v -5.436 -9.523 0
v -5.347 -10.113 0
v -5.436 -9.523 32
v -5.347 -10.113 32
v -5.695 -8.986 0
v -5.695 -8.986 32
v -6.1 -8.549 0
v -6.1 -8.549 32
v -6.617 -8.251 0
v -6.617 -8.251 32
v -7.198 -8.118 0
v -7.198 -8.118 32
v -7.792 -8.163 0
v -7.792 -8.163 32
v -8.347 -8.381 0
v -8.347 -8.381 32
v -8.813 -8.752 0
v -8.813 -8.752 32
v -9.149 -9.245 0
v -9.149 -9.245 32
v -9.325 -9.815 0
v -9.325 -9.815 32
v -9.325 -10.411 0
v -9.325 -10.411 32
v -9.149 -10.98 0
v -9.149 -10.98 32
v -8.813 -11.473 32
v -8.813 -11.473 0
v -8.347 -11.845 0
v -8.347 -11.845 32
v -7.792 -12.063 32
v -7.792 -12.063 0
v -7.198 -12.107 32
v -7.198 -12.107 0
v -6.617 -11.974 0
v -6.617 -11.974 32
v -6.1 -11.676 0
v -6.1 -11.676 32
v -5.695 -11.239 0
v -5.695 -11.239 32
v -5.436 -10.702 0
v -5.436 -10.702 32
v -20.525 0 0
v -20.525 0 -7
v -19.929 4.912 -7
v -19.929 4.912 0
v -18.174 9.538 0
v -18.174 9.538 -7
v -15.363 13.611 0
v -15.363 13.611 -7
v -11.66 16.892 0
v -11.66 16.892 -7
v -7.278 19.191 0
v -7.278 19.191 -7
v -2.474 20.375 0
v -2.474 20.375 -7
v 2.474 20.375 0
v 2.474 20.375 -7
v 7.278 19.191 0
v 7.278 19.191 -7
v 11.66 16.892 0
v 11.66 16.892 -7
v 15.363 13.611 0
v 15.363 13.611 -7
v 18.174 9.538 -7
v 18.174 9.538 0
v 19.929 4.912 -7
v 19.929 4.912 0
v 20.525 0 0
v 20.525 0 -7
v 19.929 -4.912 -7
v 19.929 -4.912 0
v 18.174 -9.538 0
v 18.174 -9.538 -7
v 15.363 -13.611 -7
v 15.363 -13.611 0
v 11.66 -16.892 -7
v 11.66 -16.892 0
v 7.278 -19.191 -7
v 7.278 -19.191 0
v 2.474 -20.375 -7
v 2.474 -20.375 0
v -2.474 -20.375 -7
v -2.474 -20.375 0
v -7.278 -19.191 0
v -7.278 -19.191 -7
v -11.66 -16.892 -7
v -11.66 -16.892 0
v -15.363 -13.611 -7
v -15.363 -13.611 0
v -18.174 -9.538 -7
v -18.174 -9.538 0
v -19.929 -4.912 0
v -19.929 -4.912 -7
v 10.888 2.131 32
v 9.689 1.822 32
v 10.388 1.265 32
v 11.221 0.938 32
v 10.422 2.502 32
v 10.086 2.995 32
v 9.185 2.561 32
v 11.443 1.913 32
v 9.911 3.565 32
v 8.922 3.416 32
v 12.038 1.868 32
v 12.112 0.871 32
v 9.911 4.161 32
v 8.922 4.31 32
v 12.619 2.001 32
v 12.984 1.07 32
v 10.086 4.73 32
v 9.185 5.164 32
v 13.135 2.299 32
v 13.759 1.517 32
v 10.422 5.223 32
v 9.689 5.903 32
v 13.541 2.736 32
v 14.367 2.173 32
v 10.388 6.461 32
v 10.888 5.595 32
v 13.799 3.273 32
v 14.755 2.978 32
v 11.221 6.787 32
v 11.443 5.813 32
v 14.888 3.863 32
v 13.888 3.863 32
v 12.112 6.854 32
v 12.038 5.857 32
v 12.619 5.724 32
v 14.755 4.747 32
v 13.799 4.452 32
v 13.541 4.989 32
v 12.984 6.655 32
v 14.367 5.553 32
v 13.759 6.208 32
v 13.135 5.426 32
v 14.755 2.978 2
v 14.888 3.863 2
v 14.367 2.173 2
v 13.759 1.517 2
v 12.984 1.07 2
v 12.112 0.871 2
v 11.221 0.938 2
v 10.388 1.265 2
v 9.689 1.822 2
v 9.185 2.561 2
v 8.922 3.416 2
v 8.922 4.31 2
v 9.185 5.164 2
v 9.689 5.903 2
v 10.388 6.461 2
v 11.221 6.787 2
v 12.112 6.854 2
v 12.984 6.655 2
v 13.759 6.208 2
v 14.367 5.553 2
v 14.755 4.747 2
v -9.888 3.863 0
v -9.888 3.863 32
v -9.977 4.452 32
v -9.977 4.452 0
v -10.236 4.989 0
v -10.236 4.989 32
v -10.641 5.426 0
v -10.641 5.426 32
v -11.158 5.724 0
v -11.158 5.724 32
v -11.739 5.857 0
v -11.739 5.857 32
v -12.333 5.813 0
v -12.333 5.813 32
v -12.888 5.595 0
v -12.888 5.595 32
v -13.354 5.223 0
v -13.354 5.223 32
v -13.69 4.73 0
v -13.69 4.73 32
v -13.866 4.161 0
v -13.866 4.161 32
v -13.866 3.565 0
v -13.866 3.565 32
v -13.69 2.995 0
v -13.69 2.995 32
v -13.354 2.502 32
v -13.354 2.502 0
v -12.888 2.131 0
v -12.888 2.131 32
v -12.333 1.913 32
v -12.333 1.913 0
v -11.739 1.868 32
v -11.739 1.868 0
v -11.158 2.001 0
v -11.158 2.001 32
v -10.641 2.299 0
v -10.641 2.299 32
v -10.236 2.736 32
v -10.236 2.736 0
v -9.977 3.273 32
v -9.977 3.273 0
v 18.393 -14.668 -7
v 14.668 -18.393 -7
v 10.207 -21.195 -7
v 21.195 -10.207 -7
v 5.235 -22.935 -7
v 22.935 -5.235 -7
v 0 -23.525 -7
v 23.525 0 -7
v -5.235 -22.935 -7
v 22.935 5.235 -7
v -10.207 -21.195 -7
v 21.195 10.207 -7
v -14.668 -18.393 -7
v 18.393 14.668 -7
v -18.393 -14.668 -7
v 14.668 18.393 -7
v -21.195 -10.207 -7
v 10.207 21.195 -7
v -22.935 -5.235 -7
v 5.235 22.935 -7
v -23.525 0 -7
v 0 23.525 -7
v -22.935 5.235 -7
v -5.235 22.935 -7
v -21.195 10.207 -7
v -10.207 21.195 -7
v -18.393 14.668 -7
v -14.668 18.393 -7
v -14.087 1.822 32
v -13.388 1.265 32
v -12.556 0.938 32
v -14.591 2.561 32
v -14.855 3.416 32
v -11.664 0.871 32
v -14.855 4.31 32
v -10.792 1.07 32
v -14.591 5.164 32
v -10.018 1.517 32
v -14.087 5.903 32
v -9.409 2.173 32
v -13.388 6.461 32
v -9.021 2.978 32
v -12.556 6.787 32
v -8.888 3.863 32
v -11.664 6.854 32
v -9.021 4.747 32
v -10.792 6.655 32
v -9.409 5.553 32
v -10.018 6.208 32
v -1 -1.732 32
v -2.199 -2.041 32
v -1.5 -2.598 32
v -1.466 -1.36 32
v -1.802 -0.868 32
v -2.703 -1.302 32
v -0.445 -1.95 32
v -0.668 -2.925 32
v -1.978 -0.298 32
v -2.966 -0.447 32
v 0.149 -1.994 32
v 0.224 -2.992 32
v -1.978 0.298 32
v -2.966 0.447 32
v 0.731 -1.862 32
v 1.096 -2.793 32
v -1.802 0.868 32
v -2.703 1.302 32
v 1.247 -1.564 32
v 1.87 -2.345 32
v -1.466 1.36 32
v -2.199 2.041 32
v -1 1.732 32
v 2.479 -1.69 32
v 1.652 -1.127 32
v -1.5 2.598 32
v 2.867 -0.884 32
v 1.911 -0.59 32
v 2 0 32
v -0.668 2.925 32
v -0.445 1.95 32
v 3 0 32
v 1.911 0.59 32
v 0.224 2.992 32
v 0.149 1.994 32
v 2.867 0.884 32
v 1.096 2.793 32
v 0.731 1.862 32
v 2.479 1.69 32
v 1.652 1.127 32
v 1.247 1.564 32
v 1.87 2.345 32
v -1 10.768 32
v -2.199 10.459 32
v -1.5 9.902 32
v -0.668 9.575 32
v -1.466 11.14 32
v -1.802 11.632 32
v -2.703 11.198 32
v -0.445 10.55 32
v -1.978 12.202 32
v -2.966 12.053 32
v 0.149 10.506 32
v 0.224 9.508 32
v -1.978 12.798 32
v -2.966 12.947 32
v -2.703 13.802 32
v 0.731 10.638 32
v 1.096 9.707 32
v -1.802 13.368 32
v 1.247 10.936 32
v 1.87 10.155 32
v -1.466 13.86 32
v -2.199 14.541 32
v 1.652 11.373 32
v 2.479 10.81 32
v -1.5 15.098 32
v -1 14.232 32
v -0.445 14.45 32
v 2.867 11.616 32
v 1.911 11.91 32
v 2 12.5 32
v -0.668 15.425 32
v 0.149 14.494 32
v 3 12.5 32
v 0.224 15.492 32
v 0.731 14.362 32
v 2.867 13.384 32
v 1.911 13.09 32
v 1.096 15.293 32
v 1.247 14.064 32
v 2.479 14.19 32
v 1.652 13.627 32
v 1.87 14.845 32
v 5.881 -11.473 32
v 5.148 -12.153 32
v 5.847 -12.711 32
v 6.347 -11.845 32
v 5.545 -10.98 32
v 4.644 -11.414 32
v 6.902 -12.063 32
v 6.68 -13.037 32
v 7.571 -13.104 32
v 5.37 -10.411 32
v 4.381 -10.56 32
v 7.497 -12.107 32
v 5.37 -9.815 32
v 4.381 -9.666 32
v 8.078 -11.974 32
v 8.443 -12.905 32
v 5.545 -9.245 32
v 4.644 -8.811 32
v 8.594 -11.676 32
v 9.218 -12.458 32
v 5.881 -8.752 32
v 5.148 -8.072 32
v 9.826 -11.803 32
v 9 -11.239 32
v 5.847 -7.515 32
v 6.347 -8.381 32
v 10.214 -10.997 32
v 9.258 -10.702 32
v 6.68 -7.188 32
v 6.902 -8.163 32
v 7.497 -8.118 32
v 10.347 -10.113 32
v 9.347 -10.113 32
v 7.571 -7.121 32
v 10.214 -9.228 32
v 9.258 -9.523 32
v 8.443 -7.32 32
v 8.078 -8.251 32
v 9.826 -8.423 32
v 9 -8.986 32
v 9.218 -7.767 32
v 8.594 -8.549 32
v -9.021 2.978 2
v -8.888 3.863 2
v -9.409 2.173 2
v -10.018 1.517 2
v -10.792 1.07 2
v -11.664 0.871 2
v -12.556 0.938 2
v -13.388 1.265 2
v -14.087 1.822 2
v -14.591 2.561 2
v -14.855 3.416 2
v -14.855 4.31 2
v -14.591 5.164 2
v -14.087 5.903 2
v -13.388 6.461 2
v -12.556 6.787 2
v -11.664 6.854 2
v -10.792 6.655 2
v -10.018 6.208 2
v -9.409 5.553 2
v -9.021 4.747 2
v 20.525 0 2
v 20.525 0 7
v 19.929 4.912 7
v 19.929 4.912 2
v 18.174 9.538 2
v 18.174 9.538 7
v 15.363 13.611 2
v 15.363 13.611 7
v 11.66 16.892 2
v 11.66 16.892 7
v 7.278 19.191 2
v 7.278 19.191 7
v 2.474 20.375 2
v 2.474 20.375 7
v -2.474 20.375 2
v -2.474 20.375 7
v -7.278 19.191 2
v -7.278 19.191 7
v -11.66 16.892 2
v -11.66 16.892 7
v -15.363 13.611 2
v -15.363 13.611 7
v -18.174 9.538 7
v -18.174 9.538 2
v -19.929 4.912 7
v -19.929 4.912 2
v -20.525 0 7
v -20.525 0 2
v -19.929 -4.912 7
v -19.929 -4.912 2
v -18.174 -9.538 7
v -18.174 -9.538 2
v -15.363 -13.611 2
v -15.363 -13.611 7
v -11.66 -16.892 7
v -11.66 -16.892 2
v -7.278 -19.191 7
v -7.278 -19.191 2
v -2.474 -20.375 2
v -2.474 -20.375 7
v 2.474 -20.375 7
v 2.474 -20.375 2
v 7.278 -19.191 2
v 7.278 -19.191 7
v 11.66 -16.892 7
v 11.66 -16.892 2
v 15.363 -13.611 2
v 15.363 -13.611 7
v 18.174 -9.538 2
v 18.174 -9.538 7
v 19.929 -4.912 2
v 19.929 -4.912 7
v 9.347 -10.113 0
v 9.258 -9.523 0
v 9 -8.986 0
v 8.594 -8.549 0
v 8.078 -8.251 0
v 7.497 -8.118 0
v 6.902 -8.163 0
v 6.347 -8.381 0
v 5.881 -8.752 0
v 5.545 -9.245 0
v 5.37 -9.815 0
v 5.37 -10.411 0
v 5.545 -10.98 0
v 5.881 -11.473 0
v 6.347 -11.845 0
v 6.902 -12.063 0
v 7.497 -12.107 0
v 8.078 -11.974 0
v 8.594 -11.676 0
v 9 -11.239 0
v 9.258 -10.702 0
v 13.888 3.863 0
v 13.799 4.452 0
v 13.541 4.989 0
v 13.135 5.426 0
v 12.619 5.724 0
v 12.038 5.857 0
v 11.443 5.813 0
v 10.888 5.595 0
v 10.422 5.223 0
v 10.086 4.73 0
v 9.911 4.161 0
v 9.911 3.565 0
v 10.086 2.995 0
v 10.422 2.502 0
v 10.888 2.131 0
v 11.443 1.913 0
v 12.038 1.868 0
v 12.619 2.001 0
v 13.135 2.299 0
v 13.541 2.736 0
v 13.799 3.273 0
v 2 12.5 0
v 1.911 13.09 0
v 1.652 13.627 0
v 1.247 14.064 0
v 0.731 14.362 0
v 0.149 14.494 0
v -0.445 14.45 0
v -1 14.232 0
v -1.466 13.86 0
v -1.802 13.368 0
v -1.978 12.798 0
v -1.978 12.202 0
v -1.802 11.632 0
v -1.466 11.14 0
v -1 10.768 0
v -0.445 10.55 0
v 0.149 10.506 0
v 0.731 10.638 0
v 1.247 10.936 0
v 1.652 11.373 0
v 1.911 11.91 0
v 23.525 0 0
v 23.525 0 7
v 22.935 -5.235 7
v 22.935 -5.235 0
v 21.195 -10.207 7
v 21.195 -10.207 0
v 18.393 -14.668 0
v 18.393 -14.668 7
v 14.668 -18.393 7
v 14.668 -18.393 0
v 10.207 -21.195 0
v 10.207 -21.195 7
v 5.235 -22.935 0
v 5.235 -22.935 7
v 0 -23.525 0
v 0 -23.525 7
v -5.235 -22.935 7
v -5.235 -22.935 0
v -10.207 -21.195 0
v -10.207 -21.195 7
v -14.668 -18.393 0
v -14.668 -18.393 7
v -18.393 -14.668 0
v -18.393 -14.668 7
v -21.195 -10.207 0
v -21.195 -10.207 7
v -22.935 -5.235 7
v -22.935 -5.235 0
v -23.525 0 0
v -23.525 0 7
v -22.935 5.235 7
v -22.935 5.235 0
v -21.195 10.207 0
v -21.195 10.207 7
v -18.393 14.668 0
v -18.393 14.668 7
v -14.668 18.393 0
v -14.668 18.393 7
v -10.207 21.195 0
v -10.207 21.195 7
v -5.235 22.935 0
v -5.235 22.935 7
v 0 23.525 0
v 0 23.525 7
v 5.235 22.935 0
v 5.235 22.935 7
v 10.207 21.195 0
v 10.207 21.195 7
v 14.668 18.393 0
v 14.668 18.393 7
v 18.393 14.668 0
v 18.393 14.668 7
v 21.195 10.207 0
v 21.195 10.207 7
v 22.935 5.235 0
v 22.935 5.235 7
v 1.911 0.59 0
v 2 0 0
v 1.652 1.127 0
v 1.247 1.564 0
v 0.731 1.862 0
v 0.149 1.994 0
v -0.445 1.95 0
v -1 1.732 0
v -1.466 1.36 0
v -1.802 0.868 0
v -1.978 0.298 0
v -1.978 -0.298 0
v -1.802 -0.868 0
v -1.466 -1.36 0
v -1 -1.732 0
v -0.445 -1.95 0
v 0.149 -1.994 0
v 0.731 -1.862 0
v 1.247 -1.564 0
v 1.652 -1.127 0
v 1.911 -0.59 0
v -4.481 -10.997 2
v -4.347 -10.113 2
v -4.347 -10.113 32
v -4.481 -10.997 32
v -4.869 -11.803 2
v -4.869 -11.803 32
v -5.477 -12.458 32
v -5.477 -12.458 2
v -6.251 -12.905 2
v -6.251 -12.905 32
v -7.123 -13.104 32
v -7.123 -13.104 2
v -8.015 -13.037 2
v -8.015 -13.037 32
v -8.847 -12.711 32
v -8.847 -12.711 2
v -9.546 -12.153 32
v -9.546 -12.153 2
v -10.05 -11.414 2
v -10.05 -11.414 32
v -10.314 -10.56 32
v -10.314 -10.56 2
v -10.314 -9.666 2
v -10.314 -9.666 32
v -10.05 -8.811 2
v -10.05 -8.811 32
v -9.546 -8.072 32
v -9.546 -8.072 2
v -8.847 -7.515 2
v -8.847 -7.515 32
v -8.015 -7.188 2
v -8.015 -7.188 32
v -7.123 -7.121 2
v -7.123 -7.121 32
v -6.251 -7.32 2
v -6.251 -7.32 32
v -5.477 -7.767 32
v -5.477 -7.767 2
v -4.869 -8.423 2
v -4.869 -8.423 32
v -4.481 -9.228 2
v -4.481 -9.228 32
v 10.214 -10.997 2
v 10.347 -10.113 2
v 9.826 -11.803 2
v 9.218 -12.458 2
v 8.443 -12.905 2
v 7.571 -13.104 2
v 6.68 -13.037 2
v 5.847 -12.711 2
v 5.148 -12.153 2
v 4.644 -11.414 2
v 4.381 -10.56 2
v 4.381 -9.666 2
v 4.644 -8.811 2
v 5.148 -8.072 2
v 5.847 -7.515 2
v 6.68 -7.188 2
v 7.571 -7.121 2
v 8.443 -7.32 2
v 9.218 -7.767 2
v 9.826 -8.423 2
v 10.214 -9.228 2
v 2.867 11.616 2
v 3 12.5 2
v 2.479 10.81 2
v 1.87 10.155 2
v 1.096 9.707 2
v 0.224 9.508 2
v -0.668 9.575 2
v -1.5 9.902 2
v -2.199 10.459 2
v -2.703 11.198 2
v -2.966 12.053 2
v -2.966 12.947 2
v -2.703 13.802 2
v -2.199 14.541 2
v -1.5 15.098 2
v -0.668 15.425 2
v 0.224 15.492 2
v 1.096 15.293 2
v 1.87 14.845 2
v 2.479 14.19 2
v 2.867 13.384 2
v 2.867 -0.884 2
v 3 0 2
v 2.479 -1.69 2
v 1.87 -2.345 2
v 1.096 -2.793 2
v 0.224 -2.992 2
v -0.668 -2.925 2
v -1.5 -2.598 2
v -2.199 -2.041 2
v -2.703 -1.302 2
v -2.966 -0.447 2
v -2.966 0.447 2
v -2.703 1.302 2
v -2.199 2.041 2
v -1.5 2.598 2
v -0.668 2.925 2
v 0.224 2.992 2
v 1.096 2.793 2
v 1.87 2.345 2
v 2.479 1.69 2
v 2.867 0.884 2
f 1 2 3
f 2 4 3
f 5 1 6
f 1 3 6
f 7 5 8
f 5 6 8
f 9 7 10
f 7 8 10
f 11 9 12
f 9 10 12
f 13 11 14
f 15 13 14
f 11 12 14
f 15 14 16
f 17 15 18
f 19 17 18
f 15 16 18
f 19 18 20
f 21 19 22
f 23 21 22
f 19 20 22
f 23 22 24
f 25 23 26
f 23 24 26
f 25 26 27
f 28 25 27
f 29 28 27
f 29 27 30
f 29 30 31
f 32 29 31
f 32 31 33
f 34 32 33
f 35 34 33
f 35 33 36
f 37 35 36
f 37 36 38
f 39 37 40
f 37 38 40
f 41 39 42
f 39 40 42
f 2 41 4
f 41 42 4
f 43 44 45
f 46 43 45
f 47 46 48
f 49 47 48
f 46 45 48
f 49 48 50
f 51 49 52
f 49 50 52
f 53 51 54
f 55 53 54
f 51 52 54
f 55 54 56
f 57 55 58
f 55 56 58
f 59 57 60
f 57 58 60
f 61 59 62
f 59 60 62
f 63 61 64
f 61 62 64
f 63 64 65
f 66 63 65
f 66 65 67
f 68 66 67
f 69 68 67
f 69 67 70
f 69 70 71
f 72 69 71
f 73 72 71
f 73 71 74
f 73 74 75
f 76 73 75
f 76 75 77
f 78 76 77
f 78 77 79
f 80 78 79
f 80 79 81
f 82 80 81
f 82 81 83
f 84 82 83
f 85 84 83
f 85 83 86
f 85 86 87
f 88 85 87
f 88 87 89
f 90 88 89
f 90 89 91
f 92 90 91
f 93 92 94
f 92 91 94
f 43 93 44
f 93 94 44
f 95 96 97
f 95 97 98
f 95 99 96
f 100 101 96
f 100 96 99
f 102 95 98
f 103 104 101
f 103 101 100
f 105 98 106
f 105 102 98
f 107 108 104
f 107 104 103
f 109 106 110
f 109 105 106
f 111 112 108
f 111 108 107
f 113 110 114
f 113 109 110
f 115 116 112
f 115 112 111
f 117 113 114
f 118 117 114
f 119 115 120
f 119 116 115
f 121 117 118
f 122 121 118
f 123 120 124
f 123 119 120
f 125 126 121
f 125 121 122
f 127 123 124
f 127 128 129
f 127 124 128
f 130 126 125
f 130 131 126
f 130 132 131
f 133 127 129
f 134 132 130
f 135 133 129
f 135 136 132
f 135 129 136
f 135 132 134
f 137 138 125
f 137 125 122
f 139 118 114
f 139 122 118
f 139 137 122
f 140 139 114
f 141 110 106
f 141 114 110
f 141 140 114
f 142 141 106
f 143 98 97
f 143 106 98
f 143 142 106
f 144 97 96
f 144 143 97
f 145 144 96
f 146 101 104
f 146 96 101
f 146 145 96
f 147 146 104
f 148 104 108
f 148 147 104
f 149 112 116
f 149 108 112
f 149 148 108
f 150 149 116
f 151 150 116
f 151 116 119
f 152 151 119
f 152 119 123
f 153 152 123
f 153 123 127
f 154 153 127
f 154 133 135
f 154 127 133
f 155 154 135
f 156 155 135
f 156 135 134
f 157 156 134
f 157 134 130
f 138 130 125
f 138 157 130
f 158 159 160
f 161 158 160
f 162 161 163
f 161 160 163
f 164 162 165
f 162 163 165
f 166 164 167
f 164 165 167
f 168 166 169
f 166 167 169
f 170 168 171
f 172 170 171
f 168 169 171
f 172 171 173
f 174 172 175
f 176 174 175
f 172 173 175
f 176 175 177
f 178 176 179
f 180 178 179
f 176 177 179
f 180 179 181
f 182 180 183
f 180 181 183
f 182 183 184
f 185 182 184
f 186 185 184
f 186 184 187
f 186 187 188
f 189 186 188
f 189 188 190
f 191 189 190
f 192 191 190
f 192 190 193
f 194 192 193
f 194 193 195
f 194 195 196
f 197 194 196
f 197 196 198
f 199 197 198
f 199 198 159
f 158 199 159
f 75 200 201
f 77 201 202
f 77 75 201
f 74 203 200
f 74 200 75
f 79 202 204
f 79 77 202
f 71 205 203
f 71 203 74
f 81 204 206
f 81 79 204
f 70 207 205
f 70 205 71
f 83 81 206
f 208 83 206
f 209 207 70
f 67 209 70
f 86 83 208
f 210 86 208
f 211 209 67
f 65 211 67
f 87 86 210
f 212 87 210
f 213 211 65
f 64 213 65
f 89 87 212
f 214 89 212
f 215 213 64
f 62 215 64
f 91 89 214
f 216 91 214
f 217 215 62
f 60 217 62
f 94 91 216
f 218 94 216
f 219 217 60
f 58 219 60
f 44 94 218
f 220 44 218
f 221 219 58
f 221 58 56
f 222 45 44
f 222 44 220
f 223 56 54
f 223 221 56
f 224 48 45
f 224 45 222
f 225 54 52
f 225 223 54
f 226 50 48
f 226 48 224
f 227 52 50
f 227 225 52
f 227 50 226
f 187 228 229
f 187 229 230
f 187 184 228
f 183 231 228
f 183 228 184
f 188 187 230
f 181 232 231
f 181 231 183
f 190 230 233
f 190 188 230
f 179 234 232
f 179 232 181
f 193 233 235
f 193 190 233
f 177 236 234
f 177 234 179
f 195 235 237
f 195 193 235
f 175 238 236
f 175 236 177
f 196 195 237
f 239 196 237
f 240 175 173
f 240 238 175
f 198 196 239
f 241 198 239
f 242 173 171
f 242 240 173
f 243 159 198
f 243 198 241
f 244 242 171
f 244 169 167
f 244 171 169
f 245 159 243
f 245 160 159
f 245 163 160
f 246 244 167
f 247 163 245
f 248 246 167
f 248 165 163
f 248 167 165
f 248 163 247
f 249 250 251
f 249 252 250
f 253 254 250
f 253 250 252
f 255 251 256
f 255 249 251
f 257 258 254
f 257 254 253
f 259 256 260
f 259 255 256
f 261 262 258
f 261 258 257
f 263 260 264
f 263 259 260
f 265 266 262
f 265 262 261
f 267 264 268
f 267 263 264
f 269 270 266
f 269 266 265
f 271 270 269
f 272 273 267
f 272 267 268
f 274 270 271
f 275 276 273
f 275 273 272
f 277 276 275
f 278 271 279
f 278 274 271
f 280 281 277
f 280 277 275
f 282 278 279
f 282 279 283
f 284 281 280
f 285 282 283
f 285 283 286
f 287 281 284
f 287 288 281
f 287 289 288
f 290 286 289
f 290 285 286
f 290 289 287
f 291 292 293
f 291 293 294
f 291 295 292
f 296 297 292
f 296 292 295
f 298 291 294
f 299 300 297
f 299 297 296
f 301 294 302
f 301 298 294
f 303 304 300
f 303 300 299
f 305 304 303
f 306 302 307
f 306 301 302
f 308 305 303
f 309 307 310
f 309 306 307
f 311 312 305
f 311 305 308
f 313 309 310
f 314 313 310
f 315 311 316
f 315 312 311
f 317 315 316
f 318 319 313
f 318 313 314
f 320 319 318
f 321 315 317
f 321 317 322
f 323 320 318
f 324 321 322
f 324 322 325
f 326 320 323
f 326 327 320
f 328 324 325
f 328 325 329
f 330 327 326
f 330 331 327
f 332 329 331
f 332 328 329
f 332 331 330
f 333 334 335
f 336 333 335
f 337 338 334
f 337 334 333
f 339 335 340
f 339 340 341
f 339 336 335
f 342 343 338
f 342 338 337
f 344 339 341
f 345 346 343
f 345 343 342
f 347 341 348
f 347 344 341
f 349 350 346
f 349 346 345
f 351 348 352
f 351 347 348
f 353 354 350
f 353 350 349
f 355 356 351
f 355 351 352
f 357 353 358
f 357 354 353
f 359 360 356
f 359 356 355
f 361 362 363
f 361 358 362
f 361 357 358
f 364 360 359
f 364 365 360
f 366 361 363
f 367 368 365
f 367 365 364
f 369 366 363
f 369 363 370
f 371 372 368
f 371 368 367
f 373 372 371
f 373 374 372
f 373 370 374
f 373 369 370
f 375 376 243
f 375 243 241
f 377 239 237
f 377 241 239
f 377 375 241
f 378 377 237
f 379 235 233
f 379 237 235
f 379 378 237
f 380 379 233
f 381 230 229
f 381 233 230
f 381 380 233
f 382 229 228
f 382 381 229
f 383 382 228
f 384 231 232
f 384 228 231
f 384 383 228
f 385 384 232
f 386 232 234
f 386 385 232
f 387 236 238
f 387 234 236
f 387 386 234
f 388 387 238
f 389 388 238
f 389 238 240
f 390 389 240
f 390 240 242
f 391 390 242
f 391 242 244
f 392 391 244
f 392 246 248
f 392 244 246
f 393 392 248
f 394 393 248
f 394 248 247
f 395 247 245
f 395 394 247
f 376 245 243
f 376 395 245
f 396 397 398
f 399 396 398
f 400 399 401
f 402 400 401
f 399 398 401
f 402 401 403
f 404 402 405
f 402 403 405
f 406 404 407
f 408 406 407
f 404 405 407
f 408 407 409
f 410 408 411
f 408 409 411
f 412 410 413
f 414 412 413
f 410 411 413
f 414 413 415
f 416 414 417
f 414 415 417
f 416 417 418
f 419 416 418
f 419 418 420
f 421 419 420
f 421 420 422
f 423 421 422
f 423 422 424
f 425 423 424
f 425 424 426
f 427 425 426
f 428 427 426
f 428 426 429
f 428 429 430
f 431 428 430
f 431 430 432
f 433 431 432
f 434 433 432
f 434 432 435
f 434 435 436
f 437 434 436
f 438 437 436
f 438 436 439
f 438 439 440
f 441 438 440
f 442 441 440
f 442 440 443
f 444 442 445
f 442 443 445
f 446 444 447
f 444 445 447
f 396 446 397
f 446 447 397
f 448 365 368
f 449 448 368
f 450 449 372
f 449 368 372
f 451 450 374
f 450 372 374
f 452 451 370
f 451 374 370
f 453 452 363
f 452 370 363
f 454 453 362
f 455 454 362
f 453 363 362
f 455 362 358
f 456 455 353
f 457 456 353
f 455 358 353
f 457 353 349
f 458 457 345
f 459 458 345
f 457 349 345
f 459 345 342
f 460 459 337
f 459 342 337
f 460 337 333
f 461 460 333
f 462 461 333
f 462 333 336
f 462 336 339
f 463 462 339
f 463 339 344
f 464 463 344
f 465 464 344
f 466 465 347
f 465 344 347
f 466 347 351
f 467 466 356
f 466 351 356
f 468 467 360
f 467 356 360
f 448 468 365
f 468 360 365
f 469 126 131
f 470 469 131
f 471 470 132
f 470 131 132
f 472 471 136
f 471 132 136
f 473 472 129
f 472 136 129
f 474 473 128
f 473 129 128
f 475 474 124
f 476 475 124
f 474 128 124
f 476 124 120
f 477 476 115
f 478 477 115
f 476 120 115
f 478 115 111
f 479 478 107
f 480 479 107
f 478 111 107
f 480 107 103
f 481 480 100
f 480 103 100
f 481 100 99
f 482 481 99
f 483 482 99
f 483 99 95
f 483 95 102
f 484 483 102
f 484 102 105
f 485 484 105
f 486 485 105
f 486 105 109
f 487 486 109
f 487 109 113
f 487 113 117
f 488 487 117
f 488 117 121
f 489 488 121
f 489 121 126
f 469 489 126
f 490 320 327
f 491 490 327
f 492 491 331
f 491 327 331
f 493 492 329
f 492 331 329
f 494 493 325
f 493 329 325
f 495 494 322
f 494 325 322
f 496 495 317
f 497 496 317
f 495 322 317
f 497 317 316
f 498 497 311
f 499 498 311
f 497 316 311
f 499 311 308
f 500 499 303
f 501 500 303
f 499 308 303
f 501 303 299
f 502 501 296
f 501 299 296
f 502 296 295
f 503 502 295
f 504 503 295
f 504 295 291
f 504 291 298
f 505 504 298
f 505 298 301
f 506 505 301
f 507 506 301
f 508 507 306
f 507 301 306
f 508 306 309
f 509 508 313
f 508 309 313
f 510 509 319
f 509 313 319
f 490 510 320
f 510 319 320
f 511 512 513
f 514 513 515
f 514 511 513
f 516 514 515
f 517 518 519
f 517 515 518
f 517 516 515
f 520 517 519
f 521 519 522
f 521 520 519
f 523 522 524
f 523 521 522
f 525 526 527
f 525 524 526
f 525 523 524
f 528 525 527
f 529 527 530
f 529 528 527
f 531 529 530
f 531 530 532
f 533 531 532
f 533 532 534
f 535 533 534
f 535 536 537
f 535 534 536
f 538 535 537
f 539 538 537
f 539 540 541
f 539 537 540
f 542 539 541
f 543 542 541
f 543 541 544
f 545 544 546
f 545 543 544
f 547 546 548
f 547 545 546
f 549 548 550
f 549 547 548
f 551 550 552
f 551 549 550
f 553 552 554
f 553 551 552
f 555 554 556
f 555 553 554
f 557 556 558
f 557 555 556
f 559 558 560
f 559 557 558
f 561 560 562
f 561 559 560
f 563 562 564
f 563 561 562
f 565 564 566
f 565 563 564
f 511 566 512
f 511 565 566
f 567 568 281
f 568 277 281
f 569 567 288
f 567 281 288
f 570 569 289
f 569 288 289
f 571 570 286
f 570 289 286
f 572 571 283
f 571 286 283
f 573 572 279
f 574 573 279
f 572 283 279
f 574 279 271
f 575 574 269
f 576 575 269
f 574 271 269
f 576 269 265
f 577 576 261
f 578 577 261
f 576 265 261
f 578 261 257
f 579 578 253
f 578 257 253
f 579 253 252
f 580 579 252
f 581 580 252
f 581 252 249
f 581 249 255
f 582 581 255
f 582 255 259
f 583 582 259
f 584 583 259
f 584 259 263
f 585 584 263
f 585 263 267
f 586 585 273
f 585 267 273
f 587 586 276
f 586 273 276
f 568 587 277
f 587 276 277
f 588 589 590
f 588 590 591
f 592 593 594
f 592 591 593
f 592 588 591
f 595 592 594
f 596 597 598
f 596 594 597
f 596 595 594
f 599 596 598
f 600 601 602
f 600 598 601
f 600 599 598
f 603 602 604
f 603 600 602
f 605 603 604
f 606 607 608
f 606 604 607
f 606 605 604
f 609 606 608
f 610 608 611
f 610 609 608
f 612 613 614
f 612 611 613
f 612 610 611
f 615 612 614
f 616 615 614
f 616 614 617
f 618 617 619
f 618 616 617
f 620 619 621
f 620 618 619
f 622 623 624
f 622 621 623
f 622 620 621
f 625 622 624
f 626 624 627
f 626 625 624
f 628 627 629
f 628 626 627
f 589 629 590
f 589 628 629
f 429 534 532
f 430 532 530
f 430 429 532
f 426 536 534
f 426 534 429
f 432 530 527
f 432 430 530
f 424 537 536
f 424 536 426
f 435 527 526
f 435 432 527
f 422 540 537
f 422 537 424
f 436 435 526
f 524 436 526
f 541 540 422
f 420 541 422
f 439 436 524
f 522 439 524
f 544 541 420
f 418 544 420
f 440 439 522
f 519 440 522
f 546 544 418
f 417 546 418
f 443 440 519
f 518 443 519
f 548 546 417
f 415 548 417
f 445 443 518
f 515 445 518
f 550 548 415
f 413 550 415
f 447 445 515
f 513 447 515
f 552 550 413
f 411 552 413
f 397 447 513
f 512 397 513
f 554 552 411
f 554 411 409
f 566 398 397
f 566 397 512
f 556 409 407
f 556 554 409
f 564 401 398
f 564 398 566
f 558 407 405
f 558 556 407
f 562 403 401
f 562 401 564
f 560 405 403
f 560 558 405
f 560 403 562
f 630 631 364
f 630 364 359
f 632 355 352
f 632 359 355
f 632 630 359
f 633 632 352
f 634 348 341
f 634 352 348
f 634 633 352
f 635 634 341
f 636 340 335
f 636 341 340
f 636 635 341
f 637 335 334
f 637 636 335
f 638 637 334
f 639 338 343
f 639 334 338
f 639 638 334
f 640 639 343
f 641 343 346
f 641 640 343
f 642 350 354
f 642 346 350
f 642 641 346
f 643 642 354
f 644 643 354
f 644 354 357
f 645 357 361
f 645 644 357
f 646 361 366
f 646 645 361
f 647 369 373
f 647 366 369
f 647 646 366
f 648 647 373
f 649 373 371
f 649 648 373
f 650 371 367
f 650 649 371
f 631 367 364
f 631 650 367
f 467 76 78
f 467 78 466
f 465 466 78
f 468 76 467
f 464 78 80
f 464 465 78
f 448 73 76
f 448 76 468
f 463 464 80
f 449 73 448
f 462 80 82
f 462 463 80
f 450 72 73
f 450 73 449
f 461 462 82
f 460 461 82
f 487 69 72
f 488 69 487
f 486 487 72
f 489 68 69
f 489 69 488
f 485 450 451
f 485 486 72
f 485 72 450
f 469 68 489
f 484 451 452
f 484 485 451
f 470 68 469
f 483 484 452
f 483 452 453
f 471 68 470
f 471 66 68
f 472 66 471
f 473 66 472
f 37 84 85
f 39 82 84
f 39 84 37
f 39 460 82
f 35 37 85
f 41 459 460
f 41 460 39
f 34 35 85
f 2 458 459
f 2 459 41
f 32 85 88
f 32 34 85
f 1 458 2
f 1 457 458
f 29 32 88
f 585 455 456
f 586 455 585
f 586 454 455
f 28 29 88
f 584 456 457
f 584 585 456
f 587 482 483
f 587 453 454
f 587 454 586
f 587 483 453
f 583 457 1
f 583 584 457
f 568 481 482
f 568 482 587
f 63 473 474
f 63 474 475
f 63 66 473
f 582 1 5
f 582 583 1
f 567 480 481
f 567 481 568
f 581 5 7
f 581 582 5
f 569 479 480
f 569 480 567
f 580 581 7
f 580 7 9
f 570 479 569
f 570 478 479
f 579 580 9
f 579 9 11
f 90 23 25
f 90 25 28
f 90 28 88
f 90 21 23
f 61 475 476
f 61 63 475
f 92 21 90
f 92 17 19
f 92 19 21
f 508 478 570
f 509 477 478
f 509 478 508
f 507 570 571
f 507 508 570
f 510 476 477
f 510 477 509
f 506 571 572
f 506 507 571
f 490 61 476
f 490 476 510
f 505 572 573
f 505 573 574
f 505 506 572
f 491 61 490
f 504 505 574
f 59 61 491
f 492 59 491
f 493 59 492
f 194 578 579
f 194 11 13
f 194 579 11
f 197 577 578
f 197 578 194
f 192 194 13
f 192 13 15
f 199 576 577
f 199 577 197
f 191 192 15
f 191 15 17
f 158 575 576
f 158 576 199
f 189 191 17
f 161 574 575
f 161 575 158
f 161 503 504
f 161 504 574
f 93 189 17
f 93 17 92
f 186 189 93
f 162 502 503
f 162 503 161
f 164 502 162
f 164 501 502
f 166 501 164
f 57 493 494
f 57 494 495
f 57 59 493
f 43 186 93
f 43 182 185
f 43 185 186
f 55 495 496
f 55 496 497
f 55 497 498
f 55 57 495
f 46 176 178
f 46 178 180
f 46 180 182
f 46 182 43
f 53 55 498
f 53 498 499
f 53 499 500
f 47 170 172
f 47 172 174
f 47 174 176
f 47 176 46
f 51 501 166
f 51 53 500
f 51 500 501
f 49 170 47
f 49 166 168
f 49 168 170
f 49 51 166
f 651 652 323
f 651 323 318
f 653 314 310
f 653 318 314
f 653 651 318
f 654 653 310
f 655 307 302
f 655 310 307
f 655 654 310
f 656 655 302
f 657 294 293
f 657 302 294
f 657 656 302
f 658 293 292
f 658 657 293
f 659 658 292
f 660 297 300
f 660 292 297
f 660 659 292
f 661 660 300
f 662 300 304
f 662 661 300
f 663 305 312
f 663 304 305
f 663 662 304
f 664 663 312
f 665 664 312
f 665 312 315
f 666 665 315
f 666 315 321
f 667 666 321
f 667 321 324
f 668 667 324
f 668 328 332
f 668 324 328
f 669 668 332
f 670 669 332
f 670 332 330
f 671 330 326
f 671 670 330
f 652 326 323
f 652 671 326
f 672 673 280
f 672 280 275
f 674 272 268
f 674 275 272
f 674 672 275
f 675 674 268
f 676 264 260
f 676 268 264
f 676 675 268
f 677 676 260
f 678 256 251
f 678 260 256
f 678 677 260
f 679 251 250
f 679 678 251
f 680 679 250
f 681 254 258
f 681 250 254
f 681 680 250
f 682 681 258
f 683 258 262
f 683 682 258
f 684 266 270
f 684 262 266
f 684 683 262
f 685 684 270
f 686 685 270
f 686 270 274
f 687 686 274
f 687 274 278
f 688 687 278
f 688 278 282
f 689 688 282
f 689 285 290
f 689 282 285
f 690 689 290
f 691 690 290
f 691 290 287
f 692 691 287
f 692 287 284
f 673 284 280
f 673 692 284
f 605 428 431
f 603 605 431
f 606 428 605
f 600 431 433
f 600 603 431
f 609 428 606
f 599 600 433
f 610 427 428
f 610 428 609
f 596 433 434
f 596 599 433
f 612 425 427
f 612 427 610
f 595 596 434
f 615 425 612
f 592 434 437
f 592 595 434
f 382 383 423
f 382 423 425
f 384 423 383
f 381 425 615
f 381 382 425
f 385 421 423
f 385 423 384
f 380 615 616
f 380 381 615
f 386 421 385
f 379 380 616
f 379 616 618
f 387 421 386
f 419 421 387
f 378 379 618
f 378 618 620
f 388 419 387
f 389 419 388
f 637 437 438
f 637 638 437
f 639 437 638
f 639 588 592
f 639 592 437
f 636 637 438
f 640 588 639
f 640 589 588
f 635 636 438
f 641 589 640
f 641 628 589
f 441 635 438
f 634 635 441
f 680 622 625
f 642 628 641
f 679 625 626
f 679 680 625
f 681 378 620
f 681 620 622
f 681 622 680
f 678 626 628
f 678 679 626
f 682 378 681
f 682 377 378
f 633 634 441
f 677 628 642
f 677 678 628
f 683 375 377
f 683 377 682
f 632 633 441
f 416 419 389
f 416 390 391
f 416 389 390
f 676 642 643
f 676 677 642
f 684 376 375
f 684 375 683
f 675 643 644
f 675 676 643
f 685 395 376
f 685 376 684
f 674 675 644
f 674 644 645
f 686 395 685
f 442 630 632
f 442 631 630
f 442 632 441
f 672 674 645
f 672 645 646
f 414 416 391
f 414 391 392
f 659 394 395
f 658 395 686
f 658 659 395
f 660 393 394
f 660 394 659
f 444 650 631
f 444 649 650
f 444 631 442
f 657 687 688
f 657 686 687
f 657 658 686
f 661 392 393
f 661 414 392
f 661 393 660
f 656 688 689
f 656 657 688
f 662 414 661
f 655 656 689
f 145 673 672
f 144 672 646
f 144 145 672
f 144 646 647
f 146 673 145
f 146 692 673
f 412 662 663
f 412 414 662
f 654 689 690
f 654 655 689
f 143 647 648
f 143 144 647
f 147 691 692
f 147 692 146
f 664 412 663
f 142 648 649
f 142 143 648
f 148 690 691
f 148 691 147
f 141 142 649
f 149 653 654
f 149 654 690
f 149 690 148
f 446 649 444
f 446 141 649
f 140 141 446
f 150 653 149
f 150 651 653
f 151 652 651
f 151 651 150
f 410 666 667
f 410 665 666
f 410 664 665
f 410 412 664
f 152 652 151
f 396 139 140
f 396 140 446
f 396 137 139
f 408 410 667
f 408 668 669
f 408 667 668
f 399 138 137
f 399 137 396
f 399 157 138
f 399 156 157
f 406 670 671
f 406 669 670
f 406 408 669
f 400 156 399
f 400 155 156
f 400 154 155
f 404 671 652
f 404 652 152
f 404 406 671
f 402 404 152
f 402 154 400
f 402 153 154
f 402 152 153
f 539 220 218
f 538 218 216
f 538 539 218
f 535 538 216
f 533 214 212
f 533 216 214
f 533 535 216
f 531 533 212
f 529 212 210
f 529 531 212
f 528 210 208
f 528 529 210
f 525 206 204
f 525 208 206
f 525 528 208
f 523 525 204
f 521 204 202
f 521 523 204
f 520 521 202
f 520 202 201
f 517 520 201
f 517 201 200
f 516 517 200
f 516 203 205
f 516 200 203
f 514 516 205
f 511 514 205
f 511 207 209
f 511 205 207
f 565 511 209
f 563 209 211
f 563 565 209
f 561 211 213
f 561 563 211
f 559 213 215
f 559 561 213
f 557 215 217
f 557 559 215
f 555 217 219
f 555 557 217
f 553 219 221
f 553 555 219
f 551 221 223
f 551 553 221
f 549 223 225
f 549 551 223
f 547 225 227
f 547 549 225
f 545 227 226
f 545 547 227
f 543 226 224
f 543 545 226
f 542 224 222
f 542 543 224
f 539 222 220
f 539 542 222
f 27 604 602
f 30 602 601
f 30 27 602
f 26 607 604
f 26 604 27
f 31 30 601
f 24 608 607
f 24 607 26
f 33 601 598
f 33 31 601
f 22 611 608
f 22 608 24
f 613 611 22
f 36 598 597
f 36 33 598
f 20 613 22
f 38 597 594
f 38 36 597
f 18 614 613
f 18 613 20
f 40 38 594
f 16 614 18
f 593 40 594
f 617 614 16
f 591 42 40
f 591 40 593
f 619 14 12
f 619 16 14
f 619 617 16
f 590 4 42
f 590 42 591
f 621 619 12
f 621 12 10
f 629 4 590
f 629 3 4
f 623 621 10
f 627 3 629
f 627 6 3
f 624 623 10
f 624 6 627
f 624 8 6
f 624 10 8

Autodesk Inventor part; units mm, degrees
ref_plane "YZ Plane" through (0, 0, 0) normal (1, 0, 0) x (0, 1, 0)
ref_plane "XZ Plane" through (0, 0, 0) normal (0, 1, 0) x (-1, 0, 0)
ref_plane "XY Plane" through (0, 0, 0) normal (0, 0, 1) x (1, 0, 0)
sketch "Boceto1" plane through (0, 0, 0) normal (0, 0, 1) x (1, 0, 0)
  line L0 (0, 55.4788) -> (0, -87.4245) construction
  line L1 (-101.2305, 0) -> (87.3085, 0) construction
  circle A0 centre (0, 0) radius 23.525
  dimension "d0" = 47.05
extrude "Extrusión1" add sketch "Boceto1" along normal blind 7
sketch "Boceto2" plane through (0, 0, 7) normal (0, 0, 1) x (1, 0, 0)
  circle A0 centre (0, 0) radius 20.525
  dimension "d3" = 41.05
extrude "Extrusión2" cut sketch "Boceto2" against normal blind 5
sketch "Boceto4" plane through (0, 0, 2) normal (0, 0, 1) x (1, 0, 0)
  line L0 (0, 23.5497) -> (0, -28.0756) construction
  line L1 (-25.4254, 0) -> (29.9443, 0) construction
  circle A0 centre (0, 0) radius 3
  circle A1 centre (0, 0) radius 12.5 construction
  circle A2 centre (0, 12.5) radius 3
  circle A3 centre (-11.8882, 3.8627) radius 3
  circle A4 centre (-7.3473, -10.1127) radius 3
  circle A5 centre (7.3473, -10.1127) radius 3
  circle A6 centre (11.8882, 3.8627) radius 3
  dimension "d16" = 25
  dimension "d15" = 6
  dimension "d17" = 6
  dimension "d20" = 360
extrude "Extrusión4" add sketch "Boceto4" along normal blind 30
sketch "Boceto5" plane through (0, 0, 32) normal (0, 0, 1) x (1, 0, 0)
  circle A0 centre (0, 0) radius 2
  circle A1 centre (-11.8882, 3.8627) radius 3 projected
  circle A2 centre (-11.8882, 3.8627) radius 2
  circle A3 centre (-7.3473, -10.1127) radius 2
  circle A4 centre (7.3473, -10.1127) radius 2
  circle A5 centre (11.8882, 3.8627) radius 2
  circle A6 centre (0, 12.5) radius 2
  dimension "d24" = 4
  dimension "d25" = 4
  dimension "d28" = 360
extrude "Extrusión5" cut sketch "Boceto5" against normal blind 40 contours A0 | A2 | A3 | A4 | A5 | A6
sketch "Boceto6" plane through (0, 0, 0) normal (0, 0, -1) x (-1, 0, 0)
  circle A0 centre (0, 0) radius 23.525
  dimension "d32" = 47.05
extrude "Extrusión6" add sketch "Boceto6" along normal blind 7
sketch "Boceto7" plane through (0, 0, -7) normal (0, 0, -1) x (-1, 0, 0)
  circle A0 centre (0, 0) radius 2 projected
  circle A1 centre (0, 0) radius 20.525
  dimension "d35" = 41.05
extrude "Extrusión7" cut sketch "Boceto7" against normal blind 7 contours A0 | A1
properties part number "TAPA CAPSULA"
